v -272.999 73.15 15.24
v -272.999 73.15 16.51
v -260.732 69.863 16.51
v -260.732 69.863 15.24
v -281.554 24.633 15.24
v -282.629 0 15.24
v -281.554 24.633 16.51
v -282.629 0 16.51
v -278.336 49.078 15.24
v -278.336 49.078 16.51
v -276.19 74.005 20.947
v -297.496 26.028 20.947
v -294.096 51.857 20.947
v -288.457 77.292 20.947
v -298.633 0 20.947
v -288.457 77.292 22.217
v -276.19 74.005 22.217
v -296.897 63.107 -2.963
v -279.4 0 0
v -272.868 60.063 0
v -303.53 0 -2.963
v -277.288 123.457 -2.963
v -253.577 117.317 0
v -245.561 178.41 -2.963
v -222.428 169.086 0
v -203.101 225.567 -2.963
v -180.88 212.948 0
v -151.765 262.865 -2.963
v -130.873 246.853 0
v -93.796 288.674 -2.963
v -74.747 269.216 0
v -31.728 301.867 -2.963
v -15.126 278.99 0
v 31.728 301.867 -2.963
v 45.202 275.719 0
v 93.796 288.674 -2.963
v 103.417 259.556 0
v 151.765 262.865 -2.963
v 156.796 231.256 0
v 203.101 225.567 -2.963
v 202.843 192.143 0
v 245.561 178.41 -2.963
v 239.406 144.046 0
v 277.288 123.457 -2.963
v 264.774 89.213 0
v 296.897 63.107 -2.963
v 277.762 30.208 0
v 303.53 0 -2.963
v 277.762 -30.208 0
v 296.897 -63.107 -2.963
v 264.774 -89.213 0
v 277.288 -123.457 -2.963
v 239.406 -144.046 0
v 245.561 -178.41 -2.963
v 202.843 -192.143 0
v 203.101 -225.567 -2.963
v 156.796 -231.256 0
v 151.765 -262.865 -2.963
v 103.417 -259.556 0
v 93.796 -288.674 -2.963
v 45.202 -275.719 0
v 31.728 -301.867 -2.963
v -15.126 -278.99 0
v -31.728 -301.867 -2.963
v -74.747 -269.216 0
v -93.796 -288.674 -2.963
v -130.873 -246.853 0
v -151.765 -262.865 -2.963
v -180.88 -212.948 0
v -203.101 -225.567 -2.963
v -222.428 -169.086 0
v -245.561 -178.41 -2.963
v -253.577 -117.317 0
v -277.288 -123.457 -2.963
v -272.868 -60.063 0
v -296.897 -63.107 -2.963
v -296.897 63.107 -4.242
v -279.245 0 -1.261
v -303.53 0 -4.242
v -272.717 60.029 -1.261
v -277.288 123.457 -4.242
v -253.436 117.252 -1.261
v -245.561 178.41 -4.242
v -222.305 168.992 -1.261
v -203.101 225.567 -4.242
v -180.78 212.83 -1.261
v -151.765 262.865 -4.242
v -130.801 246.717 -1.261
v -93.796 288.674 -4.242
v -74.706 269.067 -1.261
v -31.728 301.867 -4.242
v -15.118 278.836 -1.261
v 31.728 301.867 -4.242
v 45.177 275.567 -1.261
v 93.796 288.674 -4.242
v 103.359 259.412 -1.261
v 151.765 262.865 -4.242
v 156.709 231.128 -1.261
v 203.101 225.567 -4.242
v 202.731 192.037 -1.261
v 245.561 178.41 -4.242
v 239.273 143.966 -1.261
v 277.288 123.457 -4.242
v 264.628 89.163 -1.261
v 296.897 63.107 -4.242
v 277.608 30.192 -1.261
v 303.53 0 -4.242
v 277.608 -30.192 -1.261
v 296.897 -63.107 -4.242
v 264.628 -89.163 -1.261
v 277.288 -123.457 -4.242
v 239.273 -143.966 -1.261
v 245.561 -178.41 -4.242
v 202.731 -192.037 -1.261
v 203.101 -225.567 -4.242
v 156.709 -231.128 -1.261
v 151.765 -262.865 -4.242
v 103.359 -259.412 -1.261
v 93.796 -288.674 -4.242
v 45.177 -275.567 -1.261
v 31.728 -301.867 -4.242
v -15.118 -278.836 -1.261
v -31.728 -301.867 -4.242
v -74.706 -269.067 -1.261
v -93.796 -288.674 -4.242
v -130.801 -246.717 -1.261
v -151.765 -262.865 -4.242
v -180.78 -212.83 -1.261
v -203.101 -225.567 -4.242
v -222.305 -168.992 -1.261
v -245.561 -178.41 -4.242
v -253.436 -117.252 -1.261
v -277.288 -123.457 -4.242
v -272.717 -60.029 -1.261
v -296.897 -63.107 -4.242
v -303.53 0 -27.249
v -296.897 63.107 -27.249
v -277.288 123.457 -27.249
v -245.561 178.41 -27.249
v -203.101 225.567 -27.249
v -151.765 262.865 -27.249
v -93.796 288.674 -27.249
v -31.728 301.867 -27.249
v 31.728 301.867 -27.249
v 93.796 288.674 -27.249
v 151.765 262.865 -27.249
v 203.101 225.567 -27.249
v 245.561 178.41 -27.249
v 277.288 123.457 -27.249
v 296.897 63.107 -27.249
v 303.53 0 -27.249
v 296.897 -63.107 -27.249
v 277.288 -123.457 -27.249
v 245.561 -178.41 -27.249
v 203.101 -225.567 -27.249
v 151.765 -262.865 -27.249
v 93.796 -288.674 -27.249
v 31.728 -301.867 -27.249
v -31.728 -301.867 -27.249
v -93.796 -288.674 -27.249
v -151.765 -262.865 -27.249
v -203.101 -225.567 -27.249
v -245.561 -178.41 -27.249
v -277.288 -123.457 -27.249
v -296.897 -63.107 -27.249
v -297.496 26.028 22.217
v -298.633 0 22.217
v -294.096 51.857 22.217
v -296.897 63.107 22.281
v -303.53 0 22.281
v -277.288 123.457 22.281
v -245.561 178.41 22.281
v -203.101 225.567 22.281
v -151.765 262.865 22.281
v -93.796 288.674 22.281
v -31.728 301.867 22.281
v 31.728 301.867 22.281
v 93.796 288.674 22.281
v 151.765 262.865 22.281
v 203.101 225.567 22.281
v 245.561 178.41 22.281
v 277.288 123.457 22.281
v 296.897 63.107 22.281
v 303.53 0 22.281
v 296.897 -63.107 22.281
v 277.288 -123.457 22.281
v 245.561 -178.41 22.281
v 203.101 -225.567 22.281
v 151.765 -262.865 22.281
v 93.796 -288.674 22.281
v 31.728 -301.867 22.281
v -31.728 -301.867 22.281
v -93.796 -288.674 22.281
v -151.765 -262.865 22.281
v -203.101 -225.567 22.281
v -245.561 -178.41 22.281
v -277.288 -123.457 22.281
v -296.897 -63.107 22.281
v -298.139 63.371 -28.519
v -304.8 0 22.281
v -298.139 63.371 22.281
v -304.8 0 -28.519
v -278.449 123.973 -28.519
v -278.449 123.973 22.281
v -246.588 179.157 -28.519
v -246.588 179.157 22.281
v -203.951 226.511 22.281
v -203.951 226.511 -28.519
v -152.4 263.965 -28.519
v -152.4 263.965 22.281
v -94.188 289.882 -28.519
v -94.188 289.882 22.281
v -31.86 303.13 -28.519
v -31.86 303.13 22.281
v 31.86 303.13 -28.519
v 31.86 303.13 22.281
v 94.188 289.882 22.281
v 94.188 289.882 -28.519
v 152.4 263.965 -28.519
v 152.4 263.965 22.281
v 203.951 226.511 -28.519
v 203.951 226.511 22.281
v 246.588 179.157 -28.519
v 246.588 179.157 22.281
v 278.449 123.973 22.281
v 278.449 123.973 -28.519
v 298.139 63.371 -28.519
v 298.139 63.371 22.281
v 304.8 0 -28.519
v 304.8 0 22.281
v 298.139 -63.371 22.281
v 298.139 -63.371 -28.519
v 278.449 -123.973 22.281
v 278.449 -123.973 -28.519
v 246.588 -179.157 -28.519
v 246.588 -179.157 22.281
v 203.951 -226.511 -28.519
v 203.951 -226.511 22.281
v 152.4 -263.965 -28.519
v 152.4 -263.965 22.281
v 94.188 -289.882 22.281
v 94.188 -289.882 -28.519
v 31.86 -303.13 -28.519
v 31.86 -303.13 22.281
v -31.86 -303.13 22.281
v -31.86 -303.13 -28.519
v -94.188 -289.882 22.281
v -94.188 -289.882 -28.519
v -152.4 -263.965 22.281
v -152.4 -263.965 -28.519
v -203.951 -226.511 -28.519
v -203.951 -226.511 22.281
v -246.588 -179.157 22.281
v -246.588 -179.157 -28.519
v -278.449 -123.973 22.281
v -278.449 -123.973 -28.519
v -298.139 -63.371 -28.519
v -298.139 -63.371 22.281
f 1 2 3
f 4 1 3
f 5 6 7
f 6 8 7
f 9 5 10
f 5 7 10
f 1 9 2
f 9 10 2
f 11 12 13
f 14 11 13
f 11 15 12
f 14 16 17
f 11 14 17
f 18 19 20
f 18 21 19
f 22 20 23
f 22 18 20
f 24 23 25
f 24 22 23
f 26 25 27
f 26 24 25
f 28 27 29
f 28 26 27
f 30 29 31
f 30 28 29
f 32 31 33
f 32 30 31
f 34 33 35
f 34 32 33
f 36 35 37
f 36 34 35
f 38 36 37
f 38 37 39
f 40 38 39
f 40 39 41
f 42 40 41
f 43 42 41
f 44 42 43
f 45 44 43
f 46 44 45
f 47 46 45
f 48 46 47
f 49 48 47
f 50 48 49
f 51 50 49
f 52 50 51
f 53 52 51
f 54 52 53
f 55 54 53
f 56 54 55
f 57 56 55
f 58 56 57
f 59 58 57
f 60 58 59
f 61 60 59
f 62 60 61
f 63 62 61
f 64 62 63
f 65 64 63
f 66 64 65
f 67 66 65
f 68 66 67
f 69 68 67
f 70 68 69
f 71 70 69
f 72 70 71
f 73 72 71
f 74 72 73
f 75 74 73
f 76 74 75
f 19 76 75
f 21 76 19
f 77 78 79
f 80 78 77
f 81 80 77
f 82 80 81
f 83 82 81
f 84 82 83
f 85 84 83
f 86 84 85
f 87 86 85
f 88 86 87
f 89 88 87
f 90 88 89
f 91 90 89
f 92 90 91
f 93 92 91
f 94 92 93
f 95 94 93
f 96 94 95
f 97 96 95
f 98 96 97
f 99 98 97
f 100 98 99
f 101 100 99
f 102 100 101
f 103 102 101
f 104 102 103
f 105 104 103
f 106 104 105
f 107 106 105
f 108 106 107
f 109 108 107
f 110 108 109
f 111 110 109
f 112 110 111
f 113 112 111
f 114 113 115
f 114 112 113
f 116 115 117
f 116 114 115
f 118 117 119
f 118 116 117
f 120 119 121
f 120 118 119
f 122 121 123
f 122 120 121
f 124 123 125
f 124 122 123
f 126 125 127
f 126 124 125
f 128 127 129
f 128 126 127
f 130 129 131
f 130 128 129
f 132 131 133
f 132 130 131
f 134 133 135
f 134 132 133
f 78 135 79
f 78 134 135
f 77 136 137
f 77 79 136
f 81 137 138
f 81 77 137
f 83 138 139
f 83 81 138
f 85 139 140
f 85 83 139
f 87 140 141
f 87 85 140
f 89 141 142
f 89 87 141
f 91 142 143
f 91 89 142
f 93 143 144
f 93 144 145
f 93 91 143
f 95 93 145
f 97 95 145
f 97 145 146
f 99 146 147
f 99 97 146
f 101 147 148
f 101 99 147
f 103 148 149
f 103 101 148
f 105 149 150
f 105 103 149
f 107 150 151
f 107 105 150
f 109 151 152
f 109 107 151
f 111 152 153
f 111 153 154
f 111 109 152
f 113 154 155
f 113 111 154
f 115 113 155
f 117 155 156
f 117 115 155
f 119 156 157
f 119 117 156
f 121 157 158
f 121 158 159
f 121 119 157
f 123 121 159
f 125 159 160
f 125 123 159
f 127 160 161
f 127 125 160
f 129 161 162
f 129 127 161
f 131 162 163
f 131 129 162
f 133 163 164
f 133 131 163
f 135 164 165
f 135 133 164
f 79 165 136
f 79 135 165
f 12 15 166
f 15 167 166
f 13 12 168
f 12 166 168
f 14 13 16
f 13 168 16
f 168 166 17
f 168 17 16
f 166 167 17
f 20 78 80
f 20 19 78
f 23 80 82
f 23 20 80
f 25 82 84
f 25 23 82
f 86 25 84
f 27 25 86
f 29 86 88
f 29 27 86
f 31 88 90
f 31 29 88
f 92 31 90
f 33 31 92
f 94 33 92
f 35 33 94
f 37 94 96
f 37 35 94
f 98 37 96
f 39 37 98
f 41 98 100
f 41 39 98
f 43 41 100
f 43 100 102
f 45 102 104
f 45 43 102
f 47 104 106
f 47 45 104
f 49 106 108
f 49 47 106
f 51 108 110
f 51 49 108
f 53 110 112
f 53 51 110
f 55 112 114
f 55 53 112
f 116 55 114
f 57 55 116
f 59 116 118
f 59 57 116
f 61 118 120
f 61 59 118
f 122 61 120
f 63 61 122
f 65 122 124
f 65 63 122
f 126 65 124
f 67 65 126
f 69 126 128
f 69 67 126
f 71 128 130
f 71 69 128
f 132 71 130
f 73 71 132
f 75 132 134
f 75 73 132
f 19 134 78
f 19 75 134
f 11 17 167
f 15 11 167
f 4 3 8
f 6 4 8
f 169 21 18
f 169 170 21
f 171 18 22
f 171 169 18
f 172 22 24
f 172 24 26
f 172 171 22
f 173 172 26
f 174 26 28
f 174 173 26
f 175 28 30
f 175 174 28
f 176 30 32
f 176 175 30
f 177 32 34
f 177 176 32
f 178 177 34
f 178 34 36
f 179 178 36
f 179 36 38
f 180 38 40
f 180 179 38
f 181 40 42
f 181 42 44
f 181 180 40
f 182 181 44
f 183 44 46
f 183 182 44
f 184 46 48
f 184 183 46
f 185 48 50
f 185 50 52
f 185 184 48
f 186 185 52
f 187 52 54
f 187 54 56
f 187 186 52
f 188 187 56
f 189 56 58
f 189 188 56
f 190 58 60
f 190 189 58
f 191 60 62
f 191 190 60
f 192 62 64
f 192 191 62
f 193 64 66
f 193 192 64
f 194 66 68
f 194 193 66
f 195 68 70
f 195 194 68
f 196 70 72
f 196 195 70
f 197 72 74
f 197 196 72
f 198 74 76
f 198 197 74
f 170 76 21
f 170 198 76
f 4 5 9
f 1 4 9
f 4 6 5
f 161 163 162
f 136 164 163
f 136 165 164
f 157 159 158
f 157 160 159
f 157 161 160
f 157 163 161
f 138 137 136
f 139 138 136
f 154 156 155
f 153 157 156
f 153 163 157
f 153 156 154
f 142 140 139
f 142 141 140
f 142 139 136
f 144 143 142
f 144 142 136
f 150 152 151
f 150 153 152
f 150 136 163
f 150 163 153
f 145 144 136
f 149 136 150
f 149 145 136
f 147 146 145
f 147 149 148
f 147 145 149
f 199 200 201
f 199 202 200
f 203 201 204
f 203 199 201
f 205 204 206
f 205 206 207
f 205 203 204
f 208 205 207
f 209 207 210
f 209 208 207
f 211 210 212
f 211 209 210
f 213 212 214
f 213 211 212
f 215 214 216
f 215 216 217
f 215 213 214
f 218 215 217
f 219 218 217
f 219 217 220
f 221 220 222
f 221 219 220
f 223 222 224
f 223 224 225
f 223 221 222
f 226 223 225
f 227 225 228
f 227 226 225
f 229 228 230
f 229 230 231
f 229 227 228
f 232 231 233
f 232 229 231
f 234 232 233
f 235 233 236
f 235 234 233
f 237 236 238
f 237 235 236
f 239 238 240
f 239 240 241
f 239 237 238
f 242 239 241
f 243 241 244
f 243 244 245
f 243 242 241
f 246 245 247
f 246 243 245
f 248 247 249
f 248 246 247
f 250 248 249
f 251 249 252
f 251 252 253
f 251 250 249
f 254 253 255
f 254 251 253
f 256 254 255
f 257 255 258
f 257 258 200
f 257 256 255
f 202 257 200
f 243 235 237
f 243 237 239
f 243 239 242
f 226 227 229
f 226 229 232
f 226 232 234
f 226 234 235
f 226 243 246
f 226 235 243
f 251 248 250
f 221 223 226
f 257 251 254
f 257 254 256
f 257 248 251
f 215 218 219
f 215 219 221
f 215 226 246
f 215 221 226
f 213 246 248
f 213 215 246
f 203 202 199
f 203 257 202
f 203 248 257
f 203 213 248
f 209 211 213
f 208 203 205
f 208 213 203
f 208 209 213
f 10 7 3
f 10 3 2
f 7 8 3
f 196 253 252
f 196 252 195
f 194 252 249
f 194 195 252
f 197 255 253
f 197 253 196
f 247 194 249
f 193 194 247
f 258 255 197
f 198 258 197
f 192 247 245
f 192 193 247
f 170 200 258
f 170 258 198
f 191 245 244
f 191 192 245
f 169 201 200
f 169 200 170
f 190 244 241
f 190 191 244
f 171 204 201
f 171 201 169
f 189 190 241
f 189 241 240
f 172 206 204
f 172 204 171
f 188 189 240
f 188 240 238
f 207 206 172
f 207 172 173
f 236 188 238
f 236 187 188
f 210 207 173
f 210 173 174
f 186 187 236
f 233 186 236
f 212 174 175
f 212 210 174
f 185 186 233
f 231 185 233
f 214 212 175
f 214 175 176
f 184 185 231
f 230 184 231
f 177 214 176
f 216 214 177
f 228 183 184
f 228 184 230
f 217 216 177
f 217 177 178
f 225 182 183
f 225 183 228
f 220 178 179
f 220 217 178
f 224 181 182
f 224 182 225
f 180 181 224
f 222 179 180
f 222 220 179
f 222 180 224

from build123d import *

# Parameters (mm, degrees)
F3_W     = 12.7
F3_H     = 1.27
F4_ANGLE = 15
F7_DEPTH = 1.27
F8_DEPTH = 1.27


with BuildPart() as f2:
    # F0 (on Front) → F2 (revolve)
    with BuildSketch(Plane.XZ):
        Polygon((-304.8, 22.281272), (-304.8, -3.118728), (-304.8, -28.518728), (0, -28.518728), (0, -27.248728), (-303.53, -27.248728), (-303.53, -4.242329), (-279.245226, -1.260534), (-279.4, 0), (-303.53, -2.962791), (-303.53, 22.281272), align=None)
    revolve(axis=Axis((0, 0, -10.939999), (0, 0, -1)))


with BuildPart() as f4:
    # F3 (on Front) → F4 (revolve)
    with BuildSketch(Plane.XZ):
        with Locations((-276.279379, 15.875)):
            Rectangle(F3_W, F3_H)
        with Locations((-292.282711, 21.582052)):
            Rectangle(F3_W, F3_H)
    revolve(axis=Axis((0, 0, -10.939999), (0, 0, -1)), revolution_arc=F4_ANGLE)

    # F5 (on face) → F7 (cut, through all)
    with BuildSketch(Plane.XY.offset(22.217052)):
        Polygon((-276.18979, 74.004831), (-298.632711, 0), (-285.932711, 0), align=None)
    extrude(amount=-F7_DEPTH, mode=Mode.SUBTRACT)

    # F6 (on face) → F8 (cut, through all)
    with BuildSketch(Plane.XY.offset(16.51)):
        Polygon((-260.731759, 69.862864), (-282.629379, 0), (-269.929379, 0), align=None)
    extrude(amount=-F8_DEPTH, mode=Mode.SUBTRACT)


solid = Compound([f2.part, f4.part])
